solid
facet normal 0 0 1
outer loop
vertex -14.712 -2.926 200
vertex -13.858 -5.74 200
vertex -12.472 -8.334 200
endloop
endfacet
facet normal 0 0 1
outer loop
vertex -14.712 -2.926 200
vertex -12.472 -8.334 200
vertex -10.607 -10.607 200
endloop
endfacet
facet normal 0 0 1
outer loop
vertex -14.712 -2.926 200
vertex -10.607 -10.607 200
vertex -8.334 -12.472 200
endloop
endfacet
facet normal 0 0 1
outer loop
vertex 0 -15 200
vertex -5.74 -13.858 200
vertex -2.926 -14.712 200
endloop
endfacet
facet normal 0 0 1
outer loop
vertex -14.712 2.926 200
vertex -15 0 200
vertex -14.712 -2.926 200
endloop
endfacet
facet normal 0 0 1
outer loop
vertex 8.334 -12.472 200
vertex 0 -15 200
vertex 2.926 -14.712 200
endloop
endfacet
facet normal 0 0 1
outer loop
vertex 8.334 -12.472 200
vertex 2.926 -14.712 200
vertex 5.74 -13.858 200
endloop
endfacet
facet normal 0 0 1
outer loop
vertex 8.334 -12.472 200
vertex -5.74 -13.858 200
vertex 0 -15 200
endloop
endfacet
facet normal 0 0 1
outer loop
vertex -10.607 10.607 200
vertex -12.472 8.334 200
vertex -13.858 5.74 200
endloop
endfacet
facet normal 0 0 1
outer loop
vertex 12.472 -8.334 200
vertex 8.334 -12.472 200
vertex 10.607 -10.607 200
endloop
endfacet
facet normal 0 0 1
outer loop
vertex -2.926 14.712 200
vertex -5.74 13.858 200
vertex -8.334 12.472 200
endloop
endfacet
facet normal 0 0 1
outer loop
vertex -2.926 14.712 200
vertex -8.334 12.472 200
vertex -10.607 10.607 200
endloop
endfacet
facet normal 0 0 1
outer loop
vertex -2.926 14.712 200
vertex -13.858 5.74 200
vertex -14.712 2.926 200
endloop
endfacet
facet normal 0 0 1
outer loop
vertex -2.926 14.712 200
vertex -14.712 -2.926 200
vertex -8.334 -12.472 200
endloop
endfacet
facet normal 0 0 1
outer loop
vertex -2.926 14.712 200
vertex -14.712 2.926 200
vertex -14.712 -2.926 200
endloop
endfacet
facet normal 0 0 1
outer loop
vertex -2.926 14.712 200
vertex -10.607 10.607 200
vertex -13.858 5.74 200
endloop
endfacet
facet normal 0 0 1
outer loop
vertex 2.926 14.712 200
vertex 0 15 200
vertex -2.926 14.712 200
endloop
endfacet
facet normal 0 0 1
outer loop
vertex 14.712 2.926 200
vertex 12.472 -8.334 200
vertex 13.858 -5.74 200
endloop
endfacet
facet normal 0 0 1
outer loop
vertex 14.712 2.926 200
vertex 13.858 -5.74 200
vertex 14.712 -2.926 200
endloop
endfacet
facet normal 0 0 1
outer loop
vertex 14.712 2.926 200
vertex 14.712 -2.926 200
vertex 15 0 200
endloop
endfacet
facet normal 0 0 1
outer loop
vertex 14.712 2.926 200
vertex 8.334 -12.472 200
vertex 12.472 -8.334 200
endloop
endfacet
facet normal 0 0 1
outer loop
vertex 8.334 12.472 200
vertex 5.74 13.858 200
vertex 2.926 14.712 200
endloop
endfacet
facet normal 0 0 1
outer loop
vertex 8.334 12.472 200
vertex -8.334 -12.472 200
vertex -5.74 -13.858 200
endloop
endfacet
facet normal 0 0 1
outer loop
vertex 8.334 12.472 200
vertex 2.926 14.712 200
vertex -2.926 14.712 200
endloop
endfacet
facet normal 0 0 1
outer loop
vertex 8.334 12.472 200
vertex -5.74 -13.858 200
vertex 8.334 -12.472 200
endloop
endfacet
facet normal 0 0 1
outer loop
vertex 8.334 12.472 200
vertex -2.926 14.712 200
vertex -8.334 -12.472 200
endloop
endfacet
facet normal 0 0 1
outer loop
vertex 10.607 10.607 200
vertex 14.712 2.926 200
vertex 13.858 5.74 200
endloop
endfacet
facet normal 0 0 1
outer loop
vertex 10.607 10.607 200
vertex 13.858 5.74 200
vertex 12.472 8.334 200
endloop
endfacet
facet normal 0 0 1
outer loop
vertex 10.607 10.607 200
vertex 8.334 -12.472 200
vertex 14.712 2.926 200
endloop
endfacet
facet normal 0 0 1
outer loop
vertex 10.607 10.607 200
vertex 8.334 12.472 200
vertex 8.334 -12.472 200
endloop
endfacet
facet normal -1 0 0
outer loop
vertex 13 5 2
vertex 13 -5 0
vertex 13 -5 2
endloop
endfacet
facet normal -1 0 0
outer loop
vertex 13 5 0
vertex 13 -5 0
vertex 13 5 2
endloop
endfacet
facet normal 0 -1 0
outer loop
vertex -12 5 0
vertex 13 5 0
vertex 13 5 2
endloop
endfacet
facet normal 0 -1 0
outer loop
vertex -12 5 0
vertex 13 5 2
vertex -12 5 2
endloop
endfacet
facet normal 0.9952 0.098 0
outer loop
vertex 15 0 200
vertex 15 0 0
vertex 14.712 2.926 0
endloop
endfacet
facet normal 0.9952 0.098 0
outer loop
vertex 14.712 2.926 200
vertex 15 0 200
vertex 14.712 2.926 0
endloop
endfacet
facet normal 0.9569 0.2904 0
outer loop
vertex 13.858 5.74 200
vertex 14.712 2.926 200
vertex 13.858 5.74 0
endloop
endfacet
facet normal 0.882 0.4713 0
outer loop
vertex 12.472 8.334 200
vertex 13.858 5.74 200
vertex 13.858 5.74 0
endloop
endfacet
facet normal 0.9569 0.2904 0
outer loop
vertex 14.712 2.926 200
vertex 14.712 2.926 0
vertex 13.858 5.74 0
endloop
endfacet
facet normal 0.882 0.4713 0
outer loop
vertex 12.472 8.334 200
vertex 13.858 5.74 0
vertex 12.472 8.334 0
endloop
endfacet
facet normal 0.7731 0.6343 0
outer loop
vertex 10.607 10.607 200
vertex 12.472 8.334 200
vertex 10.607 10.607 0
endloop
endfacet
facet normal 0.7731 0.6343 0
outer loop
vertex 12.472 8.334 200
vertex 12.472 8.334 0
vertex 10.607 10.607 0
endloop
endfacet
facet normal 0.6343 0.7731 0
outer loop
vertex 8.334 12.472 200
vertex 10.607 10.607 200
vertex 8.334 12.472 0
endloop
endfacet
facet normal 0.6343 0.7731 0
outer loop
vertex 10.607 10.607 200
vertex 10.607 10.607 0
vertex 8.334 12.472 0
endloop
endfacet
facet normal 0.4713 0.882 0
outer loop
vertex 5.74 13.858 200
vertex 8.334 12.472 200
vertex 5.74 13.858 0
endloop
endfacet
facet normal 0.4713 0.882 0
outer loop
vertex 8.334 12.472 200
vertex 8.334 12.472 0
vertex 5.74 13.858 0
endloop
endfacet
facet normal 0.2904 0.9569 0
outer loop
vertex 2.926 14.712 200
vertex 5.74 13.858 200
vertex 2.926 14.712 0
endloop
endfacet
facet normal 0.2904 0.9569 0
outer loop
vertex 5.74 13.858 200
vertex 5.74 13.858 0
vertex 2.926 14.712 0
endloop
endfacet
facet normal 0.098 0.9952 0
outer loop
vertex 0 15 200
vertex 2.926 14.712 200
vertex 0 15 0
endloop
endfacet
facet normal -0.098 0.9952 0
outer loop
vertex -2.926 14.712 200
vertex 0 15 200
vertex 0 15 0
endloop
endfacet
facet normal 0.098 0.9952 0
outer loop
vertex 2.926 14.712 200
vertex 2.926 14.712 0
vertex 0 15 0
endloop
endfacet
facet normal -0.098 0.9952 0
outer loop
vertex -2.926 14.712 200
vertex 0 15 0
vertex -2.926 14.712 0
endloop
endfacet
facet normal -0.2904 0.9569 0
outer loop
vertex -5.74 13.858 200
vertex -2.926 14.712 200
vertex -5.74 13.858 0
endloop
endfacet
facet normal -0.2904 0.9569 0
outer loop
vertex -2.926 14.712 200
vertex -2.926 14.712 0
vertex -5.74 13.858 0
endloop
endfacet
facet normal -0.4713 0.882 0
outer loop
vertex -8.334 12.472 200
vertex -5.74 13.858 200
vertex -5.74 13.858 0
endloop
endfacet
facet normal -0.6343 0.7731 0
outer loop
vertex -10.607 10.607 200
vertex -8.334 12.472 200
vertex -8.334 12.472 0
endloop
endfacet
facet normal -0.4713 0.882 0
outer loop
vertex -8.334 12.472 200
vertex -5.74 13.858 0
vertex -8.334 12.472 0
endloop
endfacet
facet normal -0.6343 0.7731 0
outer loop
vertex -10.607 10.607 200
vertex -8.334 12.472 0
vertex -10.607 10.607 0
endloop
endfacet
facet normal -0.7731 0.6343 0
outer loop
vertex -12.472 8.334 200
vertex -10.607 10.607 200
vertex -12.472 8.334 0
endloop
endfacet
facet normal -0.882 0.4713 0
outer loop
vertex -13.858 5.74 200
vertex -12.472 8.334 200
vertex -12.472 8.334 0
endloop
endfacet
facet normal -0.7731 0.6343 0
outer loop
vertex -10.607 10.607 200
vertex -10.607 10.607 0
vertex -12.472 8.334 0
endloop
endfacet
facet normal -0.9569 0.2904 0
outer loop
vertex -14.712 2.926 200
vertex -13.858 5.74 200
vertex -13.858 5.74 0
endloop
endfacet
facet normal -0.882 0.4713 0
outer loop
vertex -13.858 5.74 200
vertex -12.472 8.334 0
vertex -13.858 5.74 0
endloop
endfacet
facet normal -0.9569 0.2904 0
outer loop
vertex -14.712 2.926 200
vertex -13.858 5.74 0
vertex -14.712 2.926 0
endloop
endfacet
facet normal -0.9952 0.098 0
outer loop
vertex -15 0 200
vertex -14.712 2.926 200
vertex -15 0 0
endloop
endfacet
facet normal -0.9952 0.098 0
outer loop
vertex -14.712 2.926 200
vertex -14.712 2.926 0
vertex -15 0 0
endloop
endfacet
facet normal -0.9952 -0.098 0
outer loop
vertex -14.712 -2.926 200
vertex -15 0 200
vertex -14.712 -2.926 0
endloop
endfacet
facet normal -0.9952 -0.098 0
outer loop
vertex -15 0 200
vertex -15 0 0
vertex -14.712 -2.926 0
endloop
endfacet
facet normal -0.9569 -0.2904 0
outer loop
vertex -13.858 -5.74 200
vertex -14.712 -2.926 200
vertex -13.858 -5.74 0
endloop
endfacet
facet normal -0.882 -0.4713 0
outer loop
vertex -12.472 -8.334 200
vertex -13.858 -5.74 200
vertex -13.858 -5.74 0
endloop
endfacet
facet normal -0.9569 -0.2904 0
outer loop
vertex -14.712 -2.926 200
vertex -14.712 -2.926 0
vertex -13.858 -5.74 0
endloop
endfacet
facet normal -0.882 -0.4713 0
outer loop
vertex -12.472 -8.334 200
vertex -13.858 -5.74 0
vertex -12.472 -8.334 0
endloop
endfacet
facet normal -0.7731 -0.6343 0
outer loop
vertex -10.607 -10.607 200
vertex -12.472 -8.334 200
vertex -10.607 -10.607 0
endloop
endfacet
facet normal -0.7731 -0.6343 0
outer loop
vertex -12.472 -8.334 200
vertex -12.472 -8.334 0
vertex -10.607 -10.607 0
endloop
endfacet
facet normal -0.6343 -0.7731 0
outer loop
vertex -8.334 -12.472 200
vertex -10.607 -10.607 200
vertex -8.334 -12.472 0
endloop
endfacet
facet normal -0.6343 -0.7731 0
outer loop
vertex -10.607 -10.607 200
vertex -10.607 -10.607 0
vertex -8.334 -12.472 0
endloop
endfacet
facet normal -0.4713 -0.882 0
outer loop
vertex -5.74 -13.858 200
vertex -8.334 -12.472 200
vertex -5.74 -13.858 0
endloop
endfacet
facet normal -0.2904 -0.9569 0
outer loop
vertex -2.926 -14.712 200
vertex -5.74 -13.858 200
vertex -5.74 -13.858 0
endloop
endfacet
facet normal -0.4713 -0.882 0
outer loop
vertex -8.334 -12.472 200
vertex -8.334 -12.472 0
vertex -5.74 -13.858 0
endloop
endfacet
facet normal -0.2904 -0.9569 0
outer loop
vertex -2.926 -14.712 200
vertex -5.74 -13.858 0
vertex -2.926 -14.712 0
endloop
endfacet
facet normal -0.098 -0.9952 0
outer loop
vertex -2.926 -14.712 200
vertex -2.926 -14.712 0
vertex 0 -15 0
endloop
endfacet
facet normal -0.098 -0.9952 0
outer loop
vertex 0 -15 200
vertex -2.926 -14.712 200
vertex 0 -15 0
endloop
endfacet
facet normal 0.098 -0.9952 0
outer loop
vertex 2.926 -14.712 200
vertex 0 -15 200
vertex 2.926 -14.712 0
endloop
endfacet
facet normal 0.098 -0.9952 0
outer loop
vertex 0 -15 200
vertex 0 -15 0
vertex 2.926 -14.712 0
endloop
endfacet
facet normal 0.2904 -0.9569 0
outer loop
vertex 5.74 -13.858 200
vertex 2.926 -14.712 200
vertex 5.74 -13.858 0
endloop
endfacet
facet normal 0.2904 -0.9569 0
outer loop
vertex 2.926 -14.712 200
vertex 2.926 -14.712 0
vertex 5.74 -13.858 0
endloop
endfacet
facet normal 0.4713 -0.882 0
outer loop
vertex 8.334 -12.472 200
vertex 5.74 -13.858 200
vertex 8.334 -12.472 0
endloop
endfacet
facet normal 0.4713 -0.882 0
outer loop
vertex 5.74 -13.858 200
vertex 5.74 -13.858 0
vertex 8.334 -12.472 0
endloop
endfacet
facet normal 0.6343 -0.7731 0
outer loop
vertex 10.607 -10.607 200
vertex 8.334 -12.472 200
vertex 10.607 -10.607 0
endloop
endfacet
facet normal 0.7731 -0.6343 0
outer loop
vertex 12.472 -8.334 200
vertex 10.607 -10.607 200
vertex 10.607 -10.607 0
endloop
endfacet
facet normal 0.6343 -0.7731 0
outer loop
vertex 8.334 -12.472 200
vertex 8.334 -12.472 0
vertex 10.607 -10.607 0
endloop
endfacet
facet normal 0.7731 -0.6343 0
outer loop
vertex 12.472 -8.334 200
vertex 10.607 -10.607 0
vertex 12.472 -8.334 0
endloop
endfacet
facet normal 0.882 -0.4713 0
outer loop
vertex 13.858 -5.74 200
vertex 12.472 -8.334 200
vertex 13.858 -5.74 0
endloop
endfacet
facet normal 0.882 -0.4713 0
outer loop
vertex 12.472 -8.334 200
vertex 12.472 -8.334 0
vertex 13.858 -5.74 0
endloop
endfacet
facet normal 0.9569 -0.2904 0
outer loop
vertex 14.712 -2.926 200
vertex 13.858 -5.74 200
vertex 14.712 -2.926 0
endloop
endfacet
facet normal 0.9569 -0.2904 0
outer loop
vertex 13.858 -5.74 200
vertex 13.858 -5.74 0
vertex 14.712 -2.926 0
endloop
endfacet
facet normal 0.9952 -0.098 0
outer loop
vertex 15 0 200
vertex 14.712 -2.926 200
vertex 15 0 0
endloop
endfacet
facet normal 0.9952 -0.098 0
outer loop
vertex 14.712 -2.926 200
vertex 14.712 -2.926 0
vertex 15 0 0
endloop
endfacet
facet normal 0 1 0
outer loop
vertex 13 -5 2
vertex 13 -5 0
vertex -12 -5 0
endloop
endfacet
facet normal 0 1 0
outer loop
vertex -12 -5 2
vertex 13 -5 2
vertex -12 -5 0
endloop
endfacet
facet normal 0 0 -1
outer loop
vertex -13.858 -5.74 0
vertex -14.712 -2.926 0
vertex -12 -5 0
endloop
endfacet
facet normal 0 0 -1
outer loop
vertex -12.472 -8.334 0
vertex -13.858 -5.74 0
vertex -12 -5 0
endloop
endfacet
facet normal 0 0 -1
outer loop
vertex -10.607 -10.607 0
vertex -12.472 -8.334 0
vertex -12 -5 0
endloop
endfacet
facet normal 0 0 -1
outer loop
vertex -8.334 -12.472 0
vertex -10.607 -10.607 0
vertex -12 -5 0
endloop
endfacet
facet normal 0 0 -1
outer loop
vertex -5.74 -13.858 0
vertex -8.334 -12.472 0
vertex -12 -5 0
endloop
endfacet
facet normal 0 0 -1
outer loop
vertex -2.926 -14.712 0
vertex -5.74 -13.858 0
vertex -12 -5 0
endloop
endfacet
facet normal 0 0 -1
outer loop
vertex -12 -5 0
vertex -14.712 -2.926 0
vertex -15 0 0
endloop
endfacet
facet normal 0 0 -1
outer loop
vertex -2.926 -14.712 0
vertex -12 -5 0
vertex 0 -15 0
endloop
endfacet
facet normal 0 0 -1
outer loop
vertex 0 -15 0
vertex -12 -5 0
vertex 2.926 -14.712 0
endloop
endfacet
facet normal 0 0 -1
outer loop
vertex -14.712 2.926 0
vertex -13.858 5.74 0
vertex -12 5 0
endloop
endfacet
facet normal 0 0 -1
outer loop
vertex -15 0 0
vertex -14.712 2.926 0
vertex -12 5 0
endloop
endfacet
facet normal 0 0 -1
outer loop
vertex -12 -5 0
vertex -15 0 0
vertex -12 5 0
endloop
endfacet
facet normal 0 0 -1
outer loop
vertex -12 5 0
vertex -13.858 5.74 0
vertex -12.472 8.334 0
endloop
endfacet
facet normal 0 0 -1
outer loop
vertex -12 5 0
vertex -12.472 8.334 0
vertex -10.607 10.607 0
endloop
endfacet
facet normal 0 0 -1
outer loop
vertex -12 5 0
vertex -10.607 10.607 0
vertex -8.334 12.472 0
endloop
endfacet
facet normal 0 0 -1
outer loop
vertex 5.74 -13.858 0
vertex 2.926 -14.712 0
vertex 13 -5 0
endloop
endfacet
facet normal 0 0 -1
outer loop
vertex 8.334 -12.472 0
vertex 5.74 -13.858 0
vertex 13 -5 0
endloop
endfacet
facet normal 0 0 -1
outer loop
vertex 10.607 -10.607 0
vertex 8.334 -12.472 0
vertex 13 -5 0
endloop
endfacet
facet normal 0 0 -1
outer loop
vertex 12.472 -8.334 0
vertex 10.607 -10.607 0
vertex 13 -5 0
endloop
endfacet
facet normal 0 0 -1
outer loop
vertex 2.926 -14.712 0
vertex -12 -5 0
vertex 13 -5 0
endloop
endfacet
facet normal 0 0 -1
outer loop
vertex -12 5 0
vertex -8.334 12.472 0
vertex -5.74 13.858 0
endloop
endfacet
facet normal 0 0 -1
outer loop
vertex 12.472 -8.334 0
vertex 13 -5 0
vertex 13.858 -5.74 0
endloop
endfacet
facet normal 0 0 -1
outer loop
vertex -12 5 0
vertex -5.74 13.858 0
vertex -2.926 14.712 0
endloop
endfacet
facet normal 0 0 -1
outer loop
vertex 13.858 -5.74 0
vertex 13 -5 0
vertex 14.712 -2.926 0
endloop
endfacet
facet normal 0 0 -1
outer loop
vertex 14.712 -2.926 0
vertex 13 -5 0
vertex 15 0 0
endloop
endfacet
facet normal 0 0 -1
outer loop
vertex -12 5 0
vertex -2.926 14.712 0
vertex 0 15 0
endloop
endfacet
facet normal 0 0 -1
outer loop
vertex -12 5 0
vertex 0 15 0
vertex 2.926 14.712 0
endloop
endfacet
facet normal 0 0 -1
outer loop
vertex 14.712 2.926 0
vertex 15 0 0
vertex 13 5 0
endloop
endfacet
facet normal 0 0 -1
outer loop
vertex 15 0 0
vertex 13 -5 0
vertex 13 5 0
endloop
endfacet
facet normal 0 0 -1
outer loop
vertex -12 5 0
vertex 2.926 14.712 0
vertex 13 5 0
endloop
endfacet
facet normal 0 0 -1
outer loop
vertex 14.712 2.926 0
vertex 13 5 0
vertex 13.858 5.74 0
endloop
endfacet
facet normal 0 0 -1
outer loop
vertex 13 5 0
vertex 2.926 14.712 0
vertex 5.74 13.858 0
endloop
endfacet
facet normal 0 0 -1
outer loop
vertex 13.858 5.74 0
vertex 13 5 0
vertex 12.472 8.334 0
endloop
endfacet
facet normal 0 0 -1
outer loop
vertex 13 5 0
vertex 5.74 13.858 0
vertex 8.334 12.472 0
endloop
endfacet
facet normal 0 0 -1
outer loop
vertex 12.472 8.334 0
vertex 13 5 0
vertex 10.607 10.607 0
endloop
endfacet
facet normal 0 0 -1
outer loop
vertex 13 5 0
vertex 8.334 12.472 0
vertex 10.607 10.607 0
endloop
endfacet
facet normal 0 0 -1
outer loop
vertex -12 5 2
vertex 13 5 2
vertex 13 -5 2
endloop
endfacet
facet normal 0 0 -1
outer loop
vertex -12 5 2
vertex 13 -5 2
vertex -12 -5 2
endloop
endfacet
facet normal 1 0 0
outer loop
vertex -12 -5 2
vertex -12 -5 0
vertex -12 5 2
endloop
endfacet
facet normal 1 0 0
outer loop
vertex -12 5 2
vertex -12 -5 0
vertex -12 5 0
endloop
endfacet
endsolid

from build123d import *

# Parameters (mm, degrees)
ESQUISSE1_R             = 15
BOSS_EXTRU_1_DEPTH      = 200
ESQUISSE2_W             = 25
ESQUISSE2_H             = 10
ENL_V_MAT_EXTRU_3_DEPTH = 2


with BuildPart() as part:
    # Esquisse1 → Boss.-Extru.1 (new body)
    with BuildSketch(Plane.XY):
        Circle(ESQUISSE1_R)
    extrude(amount=BOSS_EXTRU_1_DEPTH)

    # Esquisse2 → Enlèv. mat.-Extru.3 (cut)
    with BuildSketch(Plane(origin=(0, 0, 0), x_dir=(-1, 0, 0), z_dir=(0, 0, -1))):
        with Locations((-0.5, 0)):
            Rectangle(ESQUISSE2_W, ESQUISSE2_H)
    extrude(amount=-ENL_V_MAT_EXTRU_3_DEPTH, mode=Mode.SUBTRACT)


solid = part.part
